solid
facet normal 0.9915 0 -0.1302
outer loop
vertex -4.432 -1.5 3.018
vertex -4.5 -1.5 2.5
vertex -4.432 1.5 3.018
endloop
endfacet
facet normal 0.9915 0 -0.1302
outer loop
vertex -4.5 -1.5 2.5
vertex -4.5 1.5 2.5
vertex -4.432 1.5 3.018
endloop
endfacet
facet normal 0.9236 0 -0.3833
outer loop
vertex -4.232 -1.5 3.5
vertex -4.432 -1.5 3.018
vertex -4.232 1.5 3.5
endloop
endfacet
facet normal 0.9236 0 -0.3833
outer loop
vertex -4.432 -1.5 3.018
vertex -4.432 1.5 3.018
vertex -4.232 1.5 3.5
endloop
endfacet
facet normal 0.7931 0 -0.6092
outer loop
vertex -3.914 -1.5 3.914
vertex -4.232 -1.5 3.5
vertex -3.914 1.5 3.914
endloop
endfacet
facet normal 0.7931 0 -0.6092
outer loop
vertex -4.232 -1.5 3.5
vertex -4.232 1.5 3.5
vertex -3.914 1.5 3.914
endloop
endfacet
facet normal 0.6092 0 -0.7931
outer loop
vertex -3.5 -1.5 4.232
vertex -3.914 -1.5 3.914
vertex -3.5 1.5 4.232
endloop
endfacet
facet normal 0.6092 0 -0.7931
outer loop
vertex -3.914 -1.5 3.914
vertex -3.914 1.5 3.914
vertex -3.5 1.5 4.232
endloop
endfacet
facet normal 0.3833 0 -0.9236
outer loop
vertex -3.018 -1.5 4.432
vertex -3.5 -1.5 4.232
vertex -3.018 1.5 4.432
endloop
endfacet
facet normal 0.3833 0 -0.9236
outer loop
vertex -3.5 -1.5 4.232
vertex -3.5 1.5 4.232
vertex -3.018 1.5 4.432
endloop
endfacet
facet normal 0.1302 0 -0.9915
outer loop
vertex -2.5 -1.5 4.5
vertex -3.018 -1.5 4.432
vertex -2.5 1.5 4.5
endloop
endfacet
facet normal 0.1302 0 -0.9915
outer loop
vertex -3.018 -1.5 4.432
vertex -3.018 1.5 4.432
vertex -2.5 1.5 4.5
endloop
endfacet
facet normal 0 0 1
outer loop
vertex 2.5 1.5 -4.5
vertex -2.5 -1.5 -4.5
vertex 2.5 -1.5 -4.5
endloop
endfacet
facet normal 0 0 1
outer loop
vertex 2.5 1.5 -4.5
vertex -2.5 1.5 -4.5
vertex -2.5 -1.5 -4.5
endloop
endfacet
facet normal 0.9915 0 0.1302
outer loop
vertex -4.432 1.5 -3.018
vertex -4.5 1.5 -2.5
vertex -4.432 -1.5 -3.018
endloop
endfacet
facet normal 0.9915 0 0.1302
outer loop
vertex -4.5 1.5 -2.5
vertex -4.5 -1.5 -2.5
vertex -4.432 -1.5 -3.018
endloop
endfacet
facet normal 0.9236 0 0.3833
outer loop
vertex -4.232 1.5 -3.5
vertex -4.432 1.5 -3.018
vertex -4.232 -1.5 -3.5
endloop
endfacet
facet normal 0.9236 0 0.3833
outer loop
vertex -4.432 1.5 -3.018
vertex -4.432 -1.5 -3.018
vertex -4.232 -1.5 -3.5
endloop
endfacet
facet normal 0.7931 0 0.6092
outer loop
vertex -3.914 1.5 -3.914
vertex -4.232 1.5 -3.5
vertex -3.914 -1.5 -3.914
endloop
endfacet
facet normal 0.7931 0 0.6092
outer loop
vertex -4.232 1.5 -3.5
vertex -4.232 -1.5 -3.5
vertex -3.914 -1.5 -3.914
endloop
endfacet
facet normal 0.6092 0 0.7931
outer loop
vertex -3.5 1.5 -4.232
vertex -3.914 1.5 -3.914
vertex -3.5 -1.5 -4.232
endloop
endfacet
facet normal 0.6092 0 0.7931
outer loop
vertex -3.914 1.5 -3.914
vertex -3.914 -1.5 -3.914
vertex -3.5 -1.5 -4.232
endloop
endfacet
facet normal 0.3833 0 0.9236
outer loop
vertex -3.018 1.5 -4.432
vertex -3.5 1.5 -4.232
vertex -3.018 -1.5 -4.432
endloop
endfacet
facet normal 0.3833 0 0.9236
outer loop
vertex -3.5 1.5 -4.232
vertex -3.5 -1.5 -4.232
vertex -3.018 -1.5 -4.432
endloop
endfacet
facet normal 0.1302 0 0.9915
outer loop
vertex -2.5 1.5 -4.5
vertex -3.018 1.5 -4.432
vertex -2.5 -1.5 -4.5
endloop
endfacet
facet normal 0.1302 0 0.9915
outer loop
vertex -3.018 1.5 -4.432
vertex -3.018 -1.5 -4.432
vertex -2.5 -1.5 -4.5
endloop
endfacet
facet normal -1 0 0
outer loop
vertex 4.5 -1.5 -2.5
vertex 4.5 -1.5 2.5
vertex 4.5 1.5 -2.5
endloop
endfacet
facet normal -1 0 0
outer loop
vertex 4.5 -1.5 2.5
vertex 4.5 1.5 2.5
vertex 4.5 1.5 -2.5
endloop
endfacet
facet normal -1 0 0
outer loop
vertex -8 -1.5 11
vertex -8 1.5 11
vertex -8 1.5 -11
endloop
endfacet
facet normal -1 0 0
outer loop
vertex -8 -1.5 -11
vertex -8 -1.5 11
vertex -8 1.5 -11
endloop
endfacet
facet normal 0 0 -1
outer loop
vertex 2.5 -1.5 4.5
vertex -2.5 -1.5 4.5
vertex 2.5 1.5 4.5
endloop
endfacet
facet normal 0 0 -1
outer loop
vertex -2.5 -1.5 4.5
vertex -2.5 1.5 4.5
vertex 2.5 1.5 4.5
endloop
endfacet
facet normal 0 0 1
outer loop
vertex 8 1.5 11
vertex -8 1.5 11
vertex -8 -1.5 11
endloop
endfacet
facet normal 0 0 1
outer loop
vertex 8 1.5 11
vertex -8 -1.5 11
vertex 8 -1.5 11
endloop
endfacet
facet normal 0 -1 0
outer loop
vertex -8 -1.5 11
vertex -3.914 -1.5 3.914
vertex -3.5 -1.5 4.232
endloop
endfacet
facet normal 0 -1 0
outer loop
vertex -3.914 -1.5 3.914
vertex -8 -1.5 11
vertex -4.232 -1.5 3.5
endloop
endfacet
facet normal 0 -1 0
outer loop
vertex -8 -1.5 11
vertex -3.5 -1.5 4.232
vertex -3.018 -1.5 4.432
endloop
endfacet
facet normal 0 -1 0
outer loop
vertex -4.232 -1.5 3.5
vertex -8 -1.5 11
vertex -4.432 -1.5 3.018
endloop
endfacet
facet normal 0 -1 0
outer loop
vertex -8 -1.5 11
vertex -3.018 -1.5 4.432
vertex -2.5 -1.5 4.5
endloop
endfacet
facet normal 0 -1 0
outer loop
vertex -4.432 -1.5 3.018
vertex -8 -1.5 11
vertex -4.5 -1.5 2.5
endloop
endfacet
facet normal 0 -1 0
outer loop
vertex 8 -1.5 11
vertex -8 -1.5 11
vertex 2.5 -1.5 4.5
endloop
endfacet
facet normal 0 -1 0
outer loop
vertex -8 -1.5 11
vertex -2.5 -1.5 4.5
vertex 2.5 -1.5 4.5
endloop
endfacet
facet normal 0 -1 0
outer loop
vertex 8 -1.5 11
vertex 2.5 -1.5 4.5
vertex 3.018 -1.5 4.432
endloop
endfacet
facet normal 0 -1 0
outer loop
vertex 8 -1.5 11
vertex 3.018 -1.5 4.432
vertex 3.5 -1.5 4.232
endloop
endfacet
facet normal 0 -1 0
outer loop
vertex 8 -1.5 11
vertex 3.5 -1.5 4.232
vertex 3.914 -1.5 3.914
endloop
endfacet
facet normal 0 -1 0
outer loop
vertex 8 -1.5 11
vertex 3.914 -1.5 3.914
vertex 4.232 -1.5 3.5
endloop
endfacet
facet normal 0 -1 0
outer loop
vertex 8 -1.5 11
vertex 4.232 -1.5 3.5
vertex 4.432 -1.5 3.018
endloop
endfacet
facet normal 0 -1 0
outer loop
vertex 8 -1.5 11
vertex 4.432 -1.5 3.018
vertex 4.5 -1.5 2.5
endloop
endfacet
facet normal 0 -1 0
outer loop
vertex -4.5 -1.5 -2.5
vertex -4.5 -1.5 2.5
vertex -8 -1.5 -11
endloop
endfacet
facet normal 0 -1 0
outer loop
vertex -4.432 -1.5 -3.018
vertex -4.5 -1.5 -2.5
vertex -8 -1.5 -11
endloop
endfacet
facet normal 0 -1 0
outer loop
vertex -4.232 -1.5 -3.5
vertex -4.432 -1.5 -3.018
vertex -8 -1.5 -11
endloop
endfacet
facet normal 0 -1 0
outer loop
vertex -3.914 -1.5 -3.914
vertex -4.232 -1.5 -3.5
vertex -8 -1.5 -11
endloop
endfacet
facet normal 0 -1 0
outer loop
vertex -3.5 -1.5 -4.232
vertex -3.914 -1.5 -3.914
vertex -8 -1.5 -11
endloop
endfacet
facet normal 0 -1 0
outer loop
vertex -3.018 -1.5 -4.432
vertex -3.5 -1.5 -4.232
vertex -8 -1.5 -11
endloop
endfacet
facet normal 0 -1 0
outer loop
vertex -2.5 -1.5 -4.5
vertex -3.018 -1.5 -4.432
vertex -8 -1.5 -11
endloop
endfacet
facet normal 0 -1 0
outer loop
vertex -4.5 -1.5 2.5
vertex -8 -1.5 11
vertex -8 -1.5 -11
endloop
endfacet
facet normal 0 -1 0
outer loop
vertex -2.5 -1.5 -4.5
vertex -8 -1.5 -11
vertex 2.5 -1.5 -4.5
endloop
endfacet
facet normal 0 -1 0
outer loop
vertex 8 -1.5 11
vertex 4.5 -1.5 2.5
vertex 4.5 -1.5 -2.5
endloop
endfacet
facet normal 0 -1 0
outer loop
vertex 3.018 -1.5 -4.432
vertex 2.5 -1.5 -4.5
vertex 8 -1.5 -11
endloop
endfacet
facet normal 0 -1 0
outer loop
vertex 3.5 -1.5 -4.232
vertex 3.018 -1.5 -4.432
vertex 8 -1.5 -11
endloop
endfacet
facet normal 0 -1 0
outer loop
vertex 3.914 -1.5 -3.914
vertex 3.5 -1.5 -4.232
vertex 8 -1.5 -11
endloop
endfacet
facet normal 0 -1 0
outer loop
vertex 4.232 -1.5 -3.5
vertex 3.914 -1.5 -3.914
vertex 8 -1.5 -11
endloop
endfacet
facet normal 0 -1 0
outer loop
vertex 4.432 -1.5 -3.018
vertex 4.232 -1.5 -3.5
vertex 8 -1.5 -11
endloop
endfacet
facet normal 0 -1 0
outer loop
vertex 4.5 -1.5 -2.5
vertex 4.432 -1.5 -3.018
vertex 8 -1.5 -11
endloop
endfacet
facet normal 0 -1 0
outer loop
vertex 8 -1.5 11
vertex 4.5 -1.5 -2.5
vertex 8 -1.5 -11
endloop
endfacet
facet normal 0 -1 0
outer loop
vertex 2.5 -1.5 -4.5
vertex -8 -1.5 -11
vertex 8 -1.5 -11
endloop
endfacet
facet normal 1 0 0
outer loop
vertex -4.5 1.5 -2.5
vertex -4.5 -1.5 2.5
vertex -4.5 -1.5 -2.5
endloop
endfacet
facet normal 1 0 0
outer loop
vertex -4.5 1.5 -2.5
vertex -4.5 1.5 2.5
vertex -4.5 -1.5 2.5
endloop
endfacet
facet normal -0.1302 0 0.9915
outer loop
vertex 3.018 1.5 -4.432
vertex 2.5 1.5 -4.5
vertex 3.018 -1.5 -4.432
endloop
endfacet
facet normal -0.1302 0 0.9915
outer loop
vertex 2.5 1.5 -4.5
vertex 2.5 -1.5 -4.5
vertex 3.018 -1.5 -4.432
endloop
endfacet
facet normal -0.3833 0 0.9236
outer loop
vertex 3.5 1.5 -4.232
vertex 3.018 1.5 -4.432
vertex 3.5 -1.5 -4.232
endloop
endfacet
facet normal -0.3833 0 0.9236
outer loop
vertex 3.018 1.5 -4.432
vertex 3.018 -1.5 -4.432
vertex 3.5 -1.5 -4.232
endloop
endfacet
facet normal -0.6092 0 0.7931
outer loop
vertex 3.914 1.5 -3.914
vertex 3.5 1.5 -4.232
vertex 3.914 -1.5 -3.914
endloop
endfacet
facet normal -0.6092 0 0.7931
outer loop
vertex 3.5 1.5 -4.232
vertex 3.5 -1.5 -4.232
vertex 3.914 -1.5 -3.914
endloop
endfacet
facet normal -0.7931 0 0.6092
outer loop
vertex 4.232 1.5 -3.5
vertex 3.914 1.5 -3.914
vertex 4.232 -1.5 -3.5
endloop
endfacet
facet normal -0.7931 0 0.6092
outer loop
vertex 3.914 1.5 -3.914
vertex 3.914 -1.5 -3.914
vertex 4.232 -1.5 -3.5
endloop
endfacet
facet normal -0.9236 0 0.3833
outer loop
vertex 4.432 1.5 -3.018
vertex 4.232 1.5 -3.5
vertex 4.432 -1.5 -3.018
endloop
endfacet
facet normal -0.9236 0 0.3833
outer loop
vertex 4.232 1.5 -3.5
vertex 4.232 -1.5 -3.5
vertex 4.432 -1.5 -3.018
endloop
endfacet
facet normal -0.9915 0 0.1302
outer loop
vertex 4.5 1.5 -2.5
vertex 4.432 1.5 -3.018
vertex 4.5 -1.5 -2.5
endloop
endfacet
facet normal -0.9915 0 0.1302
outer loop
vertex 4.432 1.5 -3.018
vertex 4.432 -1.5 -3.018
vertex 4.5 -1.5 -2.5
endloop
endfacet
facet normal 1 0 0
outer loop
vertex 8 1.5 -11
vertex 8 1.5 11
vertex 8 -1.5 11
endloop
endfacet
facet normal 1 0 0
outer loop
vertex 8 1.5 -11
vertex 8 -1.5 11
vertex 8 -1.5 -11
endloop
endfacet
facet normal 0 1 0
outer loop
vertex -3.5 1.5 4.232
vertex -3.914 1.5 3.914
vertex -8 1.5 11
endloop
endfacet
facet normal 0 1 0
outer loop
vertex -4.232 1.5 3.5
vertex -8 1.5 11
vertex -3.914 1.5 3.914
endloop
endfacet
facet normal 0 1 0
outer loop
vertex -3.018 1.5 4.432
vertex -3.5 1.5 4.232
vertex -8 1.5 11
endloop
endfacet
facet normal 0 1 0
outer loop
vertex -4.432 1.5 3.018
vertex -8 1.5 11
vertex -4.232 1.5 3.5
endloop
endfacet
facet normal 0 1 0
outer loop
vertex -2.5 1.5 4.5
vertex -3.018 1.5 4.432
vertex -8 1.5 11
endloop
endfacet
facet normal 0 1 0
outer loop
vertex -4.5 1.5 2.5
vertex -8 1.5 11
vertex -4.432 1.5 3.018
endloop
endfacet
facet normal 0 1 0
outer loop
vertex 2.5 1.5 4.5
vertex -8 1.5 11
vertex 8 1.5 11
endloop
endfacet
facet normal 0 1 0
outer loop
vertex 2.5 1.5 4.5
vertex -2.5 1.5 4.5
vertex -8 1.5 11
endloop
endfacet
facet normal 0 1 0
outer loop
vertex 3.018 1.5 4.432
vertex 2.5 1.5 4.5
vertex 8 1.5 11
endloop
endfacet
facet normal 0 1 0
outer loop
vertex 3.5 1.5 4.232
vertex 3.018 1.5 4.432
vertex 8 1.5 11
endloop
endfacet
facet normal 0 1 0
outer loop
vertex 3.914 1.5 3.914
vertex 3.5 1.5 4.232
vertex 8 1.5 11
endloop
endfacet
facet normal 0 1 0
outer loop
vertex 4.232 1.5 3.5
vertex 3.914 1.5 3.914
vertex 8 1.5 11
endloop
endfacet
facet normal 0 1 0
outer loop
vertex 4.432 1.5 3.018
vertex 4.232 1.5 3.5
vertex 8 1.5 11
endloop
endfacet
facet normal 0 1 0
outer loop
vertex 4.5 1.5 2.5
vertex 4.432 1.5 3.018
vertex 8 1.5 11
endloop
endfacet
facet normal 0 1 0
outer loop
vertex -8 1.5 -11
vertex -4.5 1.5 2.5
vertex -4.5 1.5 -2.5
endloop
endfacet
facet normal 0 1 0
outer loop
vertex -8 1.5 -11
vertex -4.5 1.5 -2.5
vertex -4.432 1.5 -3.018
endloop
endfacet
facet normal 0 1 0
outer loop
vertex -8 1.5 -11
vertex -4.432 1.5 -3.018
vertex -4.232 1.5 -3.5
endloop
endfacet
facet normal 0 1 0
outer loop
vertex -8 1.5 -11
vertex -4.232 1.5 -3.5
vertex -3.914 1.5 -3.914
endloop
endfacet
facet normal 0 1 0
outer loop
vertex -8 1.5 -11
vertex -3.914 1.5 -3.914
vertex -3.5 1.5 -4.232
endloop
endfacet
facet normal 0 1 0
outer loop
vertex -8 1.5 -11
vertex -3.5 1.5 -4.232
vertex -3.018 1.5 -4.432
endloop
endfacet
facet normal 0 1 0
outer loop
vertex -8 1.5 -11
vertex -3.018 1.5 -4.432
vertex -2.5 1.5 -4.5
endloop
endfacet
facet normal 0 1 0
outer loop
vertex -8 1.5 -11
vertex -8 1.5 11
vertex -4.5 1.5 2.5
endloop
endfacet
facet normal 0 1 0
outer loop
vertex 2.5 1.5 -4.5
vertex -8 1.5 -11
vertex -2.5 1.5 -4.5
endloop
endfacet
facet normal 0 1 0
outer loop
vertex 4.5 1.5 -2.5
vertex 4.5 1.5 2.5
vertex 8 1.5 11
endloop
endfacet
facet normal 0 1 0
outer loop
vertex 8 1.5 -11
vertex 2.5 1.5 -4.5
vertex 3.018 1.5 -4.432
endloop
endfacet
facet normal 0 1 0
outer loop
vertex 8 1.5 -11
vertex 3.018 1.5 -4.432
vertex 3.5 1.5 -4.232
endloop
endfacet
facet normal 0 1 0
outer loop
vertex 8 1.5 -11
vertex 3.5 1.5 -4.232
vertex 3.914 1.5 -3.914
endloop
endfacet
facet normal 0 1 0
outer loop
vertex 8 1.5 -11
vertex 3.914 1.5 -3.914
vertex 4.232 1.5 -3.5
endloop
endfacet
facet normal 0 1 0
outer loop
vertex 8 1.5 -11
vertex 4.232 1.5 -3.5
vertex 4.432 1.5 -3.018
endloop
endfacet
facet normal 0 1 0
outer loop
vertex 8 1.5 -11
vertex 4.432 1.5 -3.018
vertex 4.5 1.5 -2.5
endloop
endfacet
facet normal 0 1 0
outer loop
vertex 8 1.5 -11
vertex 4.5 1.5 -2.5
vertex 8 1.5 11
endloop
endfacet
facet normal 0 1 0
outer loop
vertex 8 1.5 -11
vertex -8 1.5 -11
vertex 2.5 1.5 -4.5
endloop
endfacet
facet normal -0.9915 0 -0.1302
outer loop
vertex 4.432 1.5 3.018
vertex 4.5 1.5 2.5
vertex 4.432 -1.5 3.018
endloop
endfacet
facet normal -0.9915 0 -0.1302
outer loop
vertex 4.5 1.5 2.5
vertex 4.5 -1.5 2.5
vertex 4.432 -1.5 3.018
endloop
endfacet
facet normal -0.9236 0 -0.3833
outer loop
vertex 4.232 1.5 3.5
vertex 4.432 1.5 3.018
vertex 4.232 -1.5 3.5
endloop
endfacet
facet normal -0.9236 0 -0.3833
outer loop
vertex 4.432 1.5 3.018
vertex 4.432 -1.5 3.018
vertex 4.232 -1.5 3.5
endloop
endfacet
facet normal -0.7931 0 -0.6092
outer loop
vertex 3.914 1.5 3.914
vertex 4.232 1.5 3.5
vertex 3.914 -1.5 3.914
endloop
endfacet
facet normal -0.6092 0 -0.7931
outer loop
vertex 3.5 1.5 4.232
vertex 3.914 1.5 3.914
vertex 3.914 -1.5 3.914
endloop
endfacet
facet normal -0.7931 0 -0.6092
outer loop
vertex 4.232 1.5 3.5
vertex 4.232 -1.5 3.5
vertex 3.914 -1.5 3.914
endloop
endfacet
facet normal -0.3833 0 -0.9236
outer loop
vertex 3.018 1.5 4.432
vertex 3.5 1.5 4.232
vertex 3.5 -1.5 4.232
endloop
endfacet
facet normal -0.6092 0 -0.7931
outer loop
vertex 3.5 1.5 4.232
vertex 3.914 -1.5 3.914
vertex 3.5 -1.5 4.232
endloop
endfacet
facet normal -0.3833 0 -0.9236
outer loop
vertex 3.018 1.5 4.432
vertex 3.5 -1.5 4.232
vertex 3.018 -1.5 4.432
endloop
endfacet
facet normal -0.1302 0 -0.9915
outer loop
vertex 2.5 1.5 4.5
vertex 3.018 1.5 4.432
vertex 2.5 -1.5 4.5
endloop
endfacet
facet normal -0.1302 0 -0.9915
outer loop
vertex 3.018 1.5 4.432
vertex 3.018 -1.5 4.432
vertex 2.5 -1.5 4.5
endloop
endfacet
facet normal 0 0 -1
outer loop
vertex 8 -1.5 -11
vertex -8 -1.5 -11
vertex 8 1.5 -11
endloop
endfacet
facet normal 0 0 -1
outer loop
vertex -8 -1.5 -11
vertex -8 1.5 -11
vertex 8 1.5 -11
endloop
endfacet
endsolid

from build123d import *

# Parameters (mm, degrees)
SKETCH1_W           = 16
SKETCH1_H           = 22
SKETCH1_W_2         = 9
SKETCH1_H_2         = 9
BOSS_EXTRUDE1_DEPTH = 1.5
FILLET1_R           = 2


with BuildPart() as part:
    # Sketch1 → Boss-Extrude1 (new body, symmetric)
    with BuildSketch(Plane(origin=(0, 0, 0), x_dir=(1, 0, 0), z_dir=(0, 1, 0))):
        Rectangle(SKETCH1_W, SKETCH1_H)
        Rectangle(SKETCH1_W_2, SKETCH1_H_2, mode=Mode.SUBTRACT)
    extrude(amount=BOSS_EXTRUDE1_DEPTH, both=True)

    # Fillet1
    fillet1_edges = [part.edges().sort_by_distance(p)[0] for p in [
        (-4.5, 0, -4.5),
        (-4.5, 0, 4.5),
        (4.5, 0, 4.5),
        (4.5, 0, -4.5),
    ]]
    fillet(fillet1_edges, radius=FILLET1_R)


solid = part.part
